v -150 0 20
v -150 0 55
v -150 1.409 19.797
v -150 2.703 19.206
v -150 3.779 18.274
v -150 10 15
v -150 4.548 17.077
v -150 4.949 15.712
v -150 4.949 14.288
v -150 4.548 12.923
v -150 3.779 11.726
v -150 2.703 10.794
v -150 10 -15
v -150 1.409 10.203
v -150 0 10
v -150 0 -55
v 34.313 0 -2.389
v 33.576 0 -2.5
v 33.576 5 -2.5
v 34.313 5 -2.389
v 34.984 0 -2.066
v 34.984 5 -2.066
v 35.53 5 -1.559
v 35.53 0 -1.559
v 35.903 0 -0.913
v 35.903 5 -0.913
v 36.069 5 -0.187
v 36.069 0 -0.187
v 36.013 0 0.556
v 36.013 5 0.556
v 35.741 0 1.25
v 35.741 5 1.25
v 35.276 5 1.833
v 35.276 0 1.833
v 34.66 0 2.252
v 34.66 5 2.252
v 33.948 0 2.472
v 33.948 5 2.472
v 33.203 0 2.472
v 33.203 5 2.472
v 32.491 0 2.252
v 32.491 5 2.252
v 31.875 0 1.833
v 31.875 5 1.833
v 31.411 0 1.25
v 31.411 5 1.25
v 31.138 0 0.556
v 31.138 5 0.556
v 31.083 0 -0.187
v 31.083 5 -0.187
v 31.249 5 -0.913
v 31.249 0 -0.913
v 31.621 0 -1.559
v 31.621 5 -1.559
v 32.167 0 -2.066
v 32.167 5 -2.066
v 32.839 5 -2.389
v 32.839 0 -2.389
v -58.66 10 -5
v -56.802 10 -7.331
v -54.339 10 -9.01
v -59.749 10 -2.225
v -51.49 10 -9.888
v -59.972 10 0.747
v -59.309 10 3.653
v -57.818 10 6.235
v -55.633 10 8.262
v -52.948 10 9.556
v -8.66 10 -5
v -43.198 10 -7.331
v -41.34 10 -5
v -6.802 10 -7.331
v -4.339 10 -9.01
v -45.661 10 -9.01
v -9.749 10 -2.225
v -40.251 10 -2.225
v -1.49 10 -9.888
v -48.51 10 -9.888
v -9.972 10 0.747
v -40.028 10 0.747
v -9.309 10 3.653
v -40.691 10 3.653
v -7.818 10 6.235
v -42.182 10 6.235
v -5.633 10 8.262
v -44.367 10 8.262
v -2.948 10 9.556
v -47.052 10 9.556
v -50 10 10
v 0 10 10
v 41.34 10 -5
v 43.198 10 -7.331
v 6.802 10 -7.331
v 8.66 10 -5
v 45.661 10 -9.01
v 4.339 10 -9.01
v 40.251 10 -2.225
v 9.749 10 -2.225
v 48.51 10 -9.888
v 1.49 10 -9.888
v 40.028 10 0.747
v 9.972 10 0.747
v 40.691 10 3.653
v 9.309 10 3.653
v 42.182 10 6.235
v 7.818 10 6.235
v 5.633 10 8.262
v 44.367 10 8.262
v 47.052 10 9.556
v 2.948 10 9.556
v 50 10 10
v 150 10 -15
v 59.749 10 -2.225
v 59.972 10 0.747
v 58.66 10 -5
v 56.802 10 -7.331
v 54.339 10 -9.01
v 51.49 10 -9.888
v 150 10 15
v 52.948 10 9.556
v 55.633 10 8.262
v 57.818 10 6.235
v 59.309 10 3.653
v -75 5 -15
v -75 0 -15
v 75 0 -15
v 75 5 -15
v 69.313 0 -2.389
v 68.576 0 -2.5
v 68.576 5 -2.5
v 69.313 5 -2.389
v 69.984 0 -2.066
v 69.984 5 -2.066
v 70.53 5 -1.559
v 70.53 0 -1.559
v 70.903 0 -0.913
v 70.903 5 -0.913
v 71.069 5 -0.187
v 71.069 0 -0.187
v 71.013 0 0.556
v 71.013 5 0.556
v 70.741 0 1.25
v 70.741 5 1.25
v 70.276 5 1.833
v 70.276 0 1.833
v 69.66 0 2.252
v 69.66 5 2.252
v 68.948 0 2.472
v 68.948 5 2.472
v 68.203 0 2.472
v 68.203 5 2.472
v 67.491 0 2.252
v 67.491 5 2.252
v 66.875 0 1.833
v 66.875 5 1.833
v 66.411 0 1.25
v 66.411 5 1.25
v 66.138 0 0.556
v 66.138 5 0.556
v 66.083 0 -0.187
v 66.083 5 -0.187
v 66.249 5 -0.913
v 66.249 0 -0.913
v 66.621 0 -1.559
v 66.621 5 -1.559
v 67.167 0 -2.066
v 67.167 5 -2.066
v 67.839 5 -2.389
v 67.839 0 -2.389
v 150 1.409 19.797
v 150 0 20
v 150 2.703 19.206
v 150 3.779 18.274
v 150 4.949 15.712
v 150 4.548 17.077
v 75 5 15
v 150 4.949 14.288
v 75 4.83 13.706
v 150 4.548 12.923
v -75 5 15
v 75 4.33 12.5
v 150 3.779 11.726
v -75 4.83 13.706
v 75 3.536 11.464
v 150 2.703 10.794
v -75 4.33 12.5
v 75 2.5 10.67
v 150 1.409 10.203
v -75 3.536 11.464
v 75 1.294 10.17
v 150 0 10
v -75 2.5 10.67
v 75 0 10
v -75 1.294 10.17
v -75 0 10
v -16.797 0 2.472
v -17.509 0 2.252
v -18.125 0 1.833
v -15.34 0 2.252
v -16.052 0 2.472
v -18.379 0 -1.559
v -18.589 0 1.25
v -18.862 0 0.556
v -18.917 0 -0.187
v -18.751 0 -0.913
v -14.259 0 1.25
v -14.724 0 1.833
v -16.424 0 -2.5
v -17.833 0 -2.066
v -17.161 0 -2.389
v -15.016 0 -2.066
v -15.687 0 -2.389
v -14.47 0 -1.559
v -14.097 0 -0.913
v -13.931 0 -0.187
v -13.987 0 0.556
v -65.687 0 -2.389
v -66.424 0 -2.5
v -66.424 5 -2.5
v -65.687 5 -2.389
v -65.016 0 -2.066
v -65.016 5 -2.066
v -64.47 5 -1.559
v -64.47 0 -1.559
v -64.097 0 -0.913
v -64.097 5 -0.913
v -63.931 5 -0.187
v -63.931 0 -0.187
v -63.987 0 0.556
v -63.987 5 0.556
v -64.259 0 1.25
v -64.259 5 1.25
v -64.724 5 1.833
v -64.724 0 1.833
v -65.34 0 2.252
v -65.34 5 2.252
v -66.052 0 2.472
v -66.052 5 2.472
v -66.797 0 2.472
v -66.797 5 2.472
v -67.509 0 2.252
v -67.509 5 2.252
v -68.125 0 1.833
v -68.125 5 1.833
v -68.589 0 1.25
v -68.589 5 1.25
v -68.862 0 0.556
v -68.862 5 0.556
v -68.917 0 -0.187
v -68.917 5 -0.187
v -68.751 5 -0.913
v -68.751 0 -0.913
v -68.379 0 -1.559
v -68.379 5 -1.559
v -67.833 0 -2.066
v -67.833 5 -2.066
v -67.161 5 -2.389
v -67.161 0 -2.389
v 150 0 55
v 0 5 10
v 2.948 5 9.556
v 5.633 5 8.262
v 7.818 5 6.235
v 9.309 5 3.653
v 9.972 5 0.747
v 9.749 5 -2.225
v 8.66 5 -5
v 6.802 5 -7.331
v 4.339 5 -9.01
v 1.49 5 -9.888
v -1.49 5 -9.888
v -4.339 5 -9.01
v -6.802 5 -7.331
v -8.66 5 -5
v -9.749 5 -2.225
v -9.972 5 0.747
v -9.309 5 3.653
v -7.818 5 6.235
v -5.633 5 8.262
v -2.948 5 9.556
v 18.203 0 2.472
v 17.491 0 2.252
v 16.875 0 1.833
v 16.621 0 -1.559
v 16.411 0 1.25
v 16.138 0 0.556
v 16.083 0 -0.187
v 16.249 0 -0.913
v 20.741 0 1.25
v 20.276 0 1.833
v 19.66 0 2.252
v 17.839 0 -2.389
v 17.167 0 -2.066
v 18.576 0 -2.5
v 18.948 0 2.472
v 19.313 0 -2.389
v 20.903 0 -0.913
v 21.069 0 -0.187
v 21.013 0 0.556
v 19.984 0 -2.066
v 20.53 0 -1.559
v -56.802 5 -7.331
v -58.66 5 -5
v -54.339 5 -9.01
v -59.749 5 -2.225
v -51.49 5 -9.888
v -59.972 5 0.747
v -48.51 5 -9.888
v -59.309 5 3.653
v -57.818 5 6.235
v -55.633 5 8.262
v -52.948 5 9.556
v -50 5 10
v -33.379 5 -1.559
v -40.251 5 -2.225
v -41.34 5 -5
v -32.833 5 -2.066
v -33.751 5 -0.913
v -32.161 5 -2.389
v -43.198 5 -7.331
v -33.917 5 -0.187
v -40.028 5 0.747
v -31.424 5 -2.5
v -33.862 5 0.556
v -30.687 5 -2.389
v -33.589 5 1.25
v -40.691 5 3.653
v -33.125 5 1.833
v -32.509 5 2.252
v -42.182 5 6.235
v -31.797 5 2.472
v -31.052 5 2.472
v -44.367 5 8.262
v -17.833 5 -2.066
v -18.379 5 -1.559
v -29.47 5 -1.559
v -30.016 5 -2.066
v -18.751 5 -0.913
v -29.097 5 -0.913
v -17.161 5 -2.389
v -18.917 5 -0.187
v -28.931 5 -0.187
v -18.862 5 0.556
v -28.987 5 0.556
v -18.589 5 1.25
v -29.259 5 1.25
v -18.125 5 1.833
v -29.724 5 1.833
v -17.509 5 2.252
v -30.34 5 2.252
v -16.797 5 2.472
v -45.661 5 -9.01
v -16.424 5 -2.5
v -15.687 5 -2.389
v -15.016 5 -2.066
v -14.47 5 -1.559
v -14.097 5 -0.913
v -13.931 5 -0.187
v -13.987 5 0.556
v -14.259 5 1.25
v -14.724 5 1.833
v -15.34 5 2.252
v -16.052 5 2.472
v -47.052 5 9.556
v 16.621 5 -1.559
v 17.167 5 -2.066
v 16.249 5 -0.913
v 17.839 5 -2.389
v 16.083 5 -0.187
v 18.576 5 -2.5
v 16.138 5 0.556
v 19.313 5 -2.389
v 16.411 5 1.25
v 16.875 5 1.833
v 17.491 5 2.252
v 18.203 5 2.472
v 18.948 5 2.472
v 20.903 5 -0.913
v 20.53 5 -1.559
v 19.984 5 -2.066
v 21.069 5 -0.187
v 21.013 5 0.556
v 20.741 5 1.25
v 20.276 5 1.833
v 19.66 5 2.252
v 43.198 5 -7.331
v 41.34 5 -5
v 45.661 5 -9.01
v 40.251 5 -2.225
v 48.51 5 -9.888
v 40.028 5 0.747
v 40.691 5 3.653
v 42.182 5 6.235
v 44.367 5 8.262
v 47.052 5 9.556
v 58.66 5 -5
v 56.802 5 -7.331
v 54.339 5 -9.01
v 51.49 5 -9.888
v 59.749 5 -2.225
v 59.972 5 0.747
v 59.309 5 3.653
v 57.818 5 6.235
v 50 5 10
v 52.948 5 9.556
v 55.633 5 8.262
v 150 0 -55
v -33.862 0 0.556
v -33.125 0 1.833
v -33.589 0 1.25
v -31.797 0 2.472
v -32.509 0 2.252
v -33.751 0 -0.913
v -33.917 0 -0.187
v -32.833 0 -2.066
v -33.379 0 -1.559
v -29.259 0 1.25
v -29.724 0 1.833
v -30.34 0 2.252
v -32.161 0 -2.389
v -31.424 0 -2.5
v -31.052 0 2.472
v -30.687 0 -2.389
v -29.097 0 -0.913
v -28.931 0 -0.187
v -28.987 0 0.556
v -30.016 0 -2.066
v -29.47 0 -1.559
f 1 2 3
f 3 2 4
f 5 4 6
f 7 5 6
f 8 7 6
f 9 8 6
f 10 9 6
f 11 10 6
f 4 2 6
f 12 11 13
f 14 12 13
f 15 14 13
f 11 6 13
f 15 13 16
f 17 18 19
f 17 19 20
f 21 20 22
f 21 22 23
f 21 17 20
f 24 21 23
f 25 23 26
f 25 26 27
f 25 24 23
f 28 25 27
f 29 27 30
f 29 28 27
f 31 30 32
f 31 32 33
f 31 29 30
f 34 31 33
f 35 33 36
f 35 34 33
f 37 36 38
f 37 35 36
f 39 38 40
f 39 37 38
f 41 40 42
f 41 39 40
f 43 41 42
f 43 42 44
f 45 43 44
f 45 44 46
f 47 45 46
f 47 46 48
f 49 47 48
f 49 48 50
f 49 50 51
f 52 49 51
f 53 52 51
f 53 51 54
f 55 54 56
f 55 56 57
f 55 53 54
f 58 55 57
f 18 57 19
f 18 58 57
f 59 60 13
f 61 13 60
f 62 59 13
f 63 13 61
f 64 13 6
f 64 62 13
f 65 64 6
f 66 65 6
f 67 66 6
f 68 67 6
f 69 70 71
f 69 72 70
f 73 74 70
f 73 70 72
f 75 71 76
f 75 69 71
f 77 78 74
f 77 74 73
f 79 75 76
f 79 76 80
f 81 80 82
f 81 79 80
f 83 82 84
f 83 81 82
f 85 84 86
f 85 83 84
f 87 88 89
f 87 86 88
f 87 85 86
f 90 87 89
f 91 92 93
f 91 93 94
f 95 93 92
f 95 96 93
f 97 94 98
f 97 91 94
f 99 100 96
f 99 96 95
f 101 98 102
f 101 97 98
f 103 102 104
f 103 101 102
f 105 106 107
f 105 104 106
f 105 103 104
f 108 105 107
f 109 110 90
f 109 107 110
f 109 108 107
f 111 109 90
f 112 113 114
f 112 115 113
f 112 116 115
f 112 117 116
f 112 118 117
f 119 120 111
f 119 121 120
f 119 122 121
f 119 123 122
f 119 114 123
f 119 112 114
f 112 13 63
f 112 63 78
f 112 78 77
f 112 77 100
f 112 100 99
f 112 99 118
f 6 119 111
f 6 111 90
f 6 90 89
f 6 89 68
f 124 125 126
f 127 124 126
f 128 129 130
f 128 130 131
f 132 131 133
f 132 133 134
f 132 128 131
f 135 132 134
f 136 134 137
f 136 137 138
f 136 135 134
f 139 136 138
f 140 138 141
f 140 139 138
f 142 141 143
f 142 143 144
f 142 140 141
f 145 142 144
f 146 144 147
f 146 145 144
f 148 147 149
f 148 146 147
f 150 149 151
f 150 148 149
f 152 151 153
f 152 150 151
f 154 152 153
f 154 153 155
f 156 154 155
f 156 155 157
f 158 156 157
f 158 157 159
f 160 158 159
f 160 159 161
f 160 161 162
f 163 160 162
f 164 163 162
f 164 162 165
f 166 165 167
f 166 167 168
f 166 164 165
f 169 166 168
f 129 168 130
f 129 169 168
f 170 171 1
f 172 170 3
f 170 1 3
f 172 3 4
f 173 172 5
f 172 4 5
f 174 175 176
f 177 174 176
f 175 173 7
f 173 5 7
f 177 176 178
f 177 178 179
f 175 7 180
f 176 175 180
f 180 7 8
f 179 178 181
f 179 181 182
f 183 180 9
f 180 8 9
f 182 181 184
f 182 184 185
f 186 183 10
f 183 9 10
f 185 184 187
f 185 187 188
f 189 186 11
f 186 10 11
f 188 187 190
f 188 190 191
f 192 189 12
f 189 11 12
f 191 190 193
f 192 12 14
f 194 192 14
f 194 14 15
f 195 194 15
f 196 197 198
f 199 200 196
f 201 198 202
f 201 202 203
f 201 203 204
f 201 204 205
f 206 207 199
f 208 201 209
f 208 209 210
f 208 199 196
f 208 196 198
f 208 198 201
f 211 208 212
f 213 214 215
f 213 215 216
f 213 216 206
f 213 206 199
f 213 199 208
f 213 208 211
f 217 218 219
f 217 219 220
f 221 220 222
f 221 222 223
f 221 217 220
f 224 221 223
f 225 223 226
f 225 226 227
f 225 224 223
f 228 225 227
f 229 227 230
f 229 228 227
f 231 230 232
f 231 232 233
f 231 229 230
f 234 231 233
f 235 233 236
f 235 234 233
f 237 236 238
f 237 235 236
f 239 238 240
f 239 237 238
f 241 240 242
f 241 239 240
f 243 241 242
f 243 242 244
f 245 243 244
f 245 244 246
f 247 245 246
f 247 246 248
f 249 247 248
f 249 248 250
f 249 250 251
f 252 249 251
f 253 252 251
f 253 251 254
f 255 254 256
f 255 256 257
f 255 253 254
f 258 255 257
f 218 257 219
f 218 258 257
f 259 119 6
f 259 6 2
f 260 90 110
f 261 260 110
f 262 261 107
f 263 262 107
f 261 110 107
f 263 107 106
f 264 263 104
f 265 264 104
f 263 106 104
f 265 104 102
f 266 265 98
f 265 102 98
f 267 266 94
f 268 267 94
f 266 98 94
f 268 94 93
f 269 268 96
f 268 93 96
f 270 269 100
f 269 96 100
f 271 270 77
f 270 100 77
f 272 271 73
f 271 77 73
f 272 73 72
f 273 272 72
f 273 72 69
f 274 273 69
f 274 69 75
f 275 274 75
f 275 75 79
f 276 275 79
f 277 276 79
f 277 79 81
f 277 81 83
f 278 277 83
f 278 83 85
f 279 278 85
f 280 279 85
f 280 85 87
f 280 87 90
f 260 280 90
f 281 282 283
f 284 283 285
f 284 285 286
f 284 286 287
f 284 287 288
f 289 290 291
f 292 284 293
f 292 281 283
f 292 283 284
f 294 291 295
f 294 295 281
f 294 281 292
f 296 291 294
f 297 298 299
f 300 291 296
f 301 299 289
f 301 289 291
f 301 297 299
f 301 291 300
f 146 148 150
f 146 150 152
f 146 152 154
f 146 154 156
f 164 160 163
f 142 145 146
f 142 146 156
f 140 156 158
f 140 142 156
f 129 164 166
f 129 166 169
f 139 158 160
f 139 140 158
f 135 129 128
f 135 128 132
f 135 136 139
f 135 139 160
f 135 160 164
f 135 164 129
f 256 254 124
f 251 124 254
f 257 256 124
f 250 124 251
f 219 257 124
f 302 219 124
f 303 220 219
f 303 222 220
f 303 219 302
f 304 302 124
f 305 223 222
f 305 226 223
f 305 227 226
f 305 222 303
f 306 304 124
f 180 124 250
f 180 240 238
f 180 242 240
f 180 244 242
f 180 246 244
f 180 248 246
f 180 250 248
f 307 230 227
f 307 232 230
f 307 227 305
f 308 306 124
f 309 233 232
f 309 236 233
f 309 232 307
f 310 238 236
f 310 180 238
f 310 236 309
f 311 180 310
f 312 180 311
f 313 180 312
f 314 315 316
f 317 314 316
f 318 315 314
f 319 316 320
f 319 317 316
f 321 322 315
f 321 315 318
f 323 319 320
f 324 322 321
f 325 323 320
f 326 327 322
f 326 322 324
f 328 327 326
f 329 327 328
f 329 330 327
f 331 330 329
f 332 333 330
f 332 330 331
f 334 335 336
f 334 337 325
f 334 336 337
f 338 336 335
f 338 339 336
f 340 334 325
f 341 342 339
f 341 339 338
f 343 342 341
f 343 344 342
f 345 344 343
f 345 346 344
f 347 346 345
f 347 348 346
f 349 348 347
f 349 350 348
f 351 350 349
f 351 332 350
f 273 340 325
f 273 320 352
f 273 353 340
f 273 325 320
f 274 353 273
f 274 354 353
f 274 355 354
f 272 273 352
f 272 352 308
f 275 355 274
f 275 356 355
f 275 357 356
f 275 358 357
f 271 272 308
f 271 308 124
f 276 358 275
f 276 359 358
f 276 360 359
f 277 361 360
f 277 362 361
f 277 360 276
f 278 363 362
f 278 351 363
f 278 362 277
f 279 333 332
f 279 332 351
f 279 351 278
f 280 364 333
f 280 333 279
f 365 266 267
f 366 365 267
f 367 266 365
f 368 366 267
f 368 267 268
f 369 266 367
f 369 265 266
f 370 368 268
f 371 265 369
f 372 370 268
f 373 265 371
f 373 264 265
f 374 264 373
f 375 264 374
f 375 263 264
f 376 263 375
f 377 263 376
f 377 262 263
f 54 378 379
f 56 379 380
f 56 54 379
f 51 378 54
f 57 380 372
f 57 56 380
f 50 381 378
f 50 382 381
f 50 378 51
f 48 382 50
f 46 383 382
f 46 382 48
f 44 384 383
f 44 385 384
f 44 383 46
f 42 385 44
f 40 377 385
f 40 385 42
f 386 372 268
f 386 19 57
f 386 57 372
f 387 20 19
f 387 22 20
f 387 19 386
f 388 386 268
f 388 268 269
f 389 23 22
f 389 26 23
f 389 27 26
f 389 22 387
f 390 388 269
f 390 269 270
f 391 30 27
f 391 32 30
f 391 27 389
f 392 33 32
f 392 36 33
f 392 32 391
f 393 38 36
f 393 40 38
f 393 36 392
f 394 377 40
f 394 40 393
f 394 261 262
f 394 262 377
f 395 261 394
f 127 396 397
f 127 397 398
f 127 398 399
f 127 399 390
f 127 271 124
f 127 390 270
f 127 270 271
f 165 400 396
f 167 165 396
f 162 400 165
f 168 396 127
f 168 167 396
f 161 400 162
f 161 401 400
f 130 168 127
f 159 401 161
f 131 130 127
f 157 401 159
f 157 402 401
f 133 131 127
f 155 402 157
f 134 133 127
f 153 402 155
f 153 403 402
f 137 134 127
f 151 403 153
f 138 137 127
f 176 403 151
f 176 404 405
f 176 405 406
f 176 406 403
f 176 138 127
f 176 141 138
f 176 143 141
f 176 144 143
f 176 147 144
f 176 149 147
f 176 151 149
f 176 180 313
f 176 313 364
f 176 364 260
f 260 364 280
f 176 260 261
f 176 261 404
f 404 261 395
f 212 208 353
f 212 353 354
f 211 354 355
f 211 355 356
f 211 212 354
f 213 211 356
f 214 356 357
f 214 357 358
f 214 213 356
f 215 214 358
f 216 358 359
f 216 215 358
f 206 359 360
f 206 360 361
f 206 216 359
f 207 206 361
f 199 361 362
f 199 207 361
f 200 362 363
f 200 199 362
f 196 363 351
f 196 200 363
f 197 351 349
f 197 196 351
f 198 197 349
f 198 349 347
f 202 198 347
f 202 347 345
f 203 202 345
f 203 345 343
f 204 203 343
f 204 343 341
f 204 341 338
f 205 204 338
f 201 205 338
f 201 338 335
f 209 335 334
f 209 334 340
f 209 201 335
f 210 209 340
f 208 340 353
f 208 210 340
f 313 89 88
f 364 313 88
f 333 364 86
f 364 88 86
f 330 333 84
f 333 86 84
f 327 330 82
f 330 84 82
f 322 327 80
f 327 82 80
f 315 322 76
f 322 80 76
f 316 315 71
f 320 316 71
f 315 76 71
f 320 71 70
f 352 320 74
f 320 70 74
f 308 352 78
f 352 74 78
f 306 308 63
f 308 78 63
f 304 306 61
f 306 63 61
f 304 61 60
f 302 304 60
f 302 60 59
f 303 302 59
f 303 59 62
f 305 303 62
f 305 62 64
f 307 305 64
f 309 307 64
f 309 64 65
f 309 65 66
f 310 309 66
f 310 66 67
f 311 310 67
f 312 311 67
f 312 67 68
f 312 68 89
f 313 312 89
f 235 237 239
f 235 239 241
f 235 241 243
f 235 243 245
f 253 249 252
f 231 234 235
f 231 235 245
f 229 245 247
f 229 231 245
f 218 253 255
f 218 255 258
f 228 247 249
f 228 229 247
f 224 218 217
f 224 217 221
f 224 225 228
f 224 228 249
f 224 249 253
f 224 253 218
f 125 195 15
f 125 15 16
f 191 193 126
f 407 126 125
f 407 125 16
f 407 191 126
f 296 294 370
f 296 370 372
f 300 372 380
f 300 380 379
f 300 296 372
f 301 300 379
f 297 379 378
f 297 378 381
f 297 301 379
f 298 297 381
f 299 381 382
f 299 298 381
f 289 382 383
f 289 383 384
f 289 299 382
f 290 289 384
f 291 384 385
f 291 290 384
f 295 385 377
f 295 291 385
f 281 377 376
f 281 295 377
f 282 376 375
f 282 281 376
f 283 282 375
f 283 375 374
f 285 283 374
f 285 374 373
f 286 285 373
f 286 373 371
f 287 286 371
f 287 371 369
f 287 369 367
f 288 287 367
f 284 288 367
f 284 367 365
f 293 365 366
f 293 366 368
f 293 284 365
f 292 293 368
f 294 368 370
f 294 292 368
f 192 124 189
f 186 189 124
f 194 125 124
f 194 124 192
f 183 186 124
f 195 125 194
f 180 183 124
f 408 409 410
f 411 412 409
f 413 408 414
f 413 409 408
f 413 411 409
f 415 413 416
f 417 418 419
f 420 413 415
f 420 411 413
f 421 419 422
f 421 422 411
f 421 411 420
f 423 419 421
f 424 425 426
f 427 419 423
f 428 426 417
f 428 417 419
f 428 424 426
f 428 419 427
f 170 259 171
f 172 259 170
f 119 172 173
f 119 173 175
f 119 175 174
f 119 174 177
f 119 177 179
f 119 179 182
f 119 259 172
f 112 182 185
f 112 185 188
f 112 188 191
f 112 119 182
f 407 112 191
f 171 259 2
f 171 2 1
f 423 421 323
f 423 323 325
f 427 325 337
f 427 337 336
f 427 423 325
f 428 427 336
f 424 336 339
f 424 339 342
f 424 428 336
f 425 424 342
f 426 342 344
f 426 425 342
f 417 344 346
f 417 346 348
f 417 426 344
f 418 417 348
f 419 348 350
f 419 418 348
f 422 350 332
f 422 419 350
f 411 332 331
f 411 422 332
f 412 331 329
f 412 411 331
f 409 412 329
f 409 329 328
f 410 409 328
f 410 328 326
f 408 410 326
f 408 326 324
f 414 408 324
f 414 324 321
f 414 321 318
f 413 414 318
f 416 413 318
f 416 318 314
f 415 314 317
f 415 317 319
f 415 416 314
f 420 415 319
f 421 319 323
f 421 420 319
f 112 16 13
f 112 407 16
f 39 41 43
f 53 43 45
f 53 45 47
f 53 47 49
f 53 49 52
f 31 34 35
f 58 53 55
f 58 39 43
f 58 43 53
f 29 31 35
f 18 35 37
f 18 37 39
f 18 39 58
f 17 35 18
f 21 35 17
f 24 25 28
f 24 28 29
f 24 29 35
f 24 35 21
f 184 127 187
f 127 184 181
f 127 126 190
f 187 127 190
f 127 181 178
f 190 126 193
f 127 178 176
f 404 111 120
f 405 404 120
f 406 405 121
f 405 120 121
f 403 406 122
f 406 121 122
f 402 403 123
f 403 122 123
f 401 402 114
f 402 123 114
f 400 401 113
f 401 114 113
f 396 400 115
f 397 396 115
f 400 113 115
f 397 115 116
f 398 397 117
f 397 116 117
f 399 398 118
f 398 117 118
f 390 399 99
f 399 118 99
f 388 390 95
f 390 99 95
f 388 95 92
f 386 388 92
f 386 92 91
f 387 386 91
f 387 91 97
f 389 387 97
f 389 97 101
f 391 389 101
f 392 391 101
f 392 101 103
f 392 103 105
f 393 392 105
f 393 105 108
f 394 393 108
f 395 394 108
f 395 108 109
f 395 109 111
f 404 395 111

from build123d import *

# Parameters (mm, degrees)
BOSS_EXTRU_1_DEPTH      = 150
ESQUISSE3_R             = 5
ENL_V_MAT_EXTRU_1_DEPTH = 306.163890393
ESQUISSE5_R             = 10
ENL_V_MAT_EXTRU_2_DEPTH = 161.078105936
ESQUISSE6_W             = 150
ESQUISSE6_H             = 30
ESQUISSE6_R             = 2.5
ENL_V_MAT_EXTRU_3_DEPTH = 5


with BuildPart() as part:
    # Esquisse2 → Boss.-Extru.1 (new, symmetric)
    with BuildSketch(Plane(origin=(0, 0, 0), x_dir=(0, 0, -1), z_dir=(1, 0, 0))):
        Polygon((15, 0), (55, 0), (15, 10), (-15, 10), (-55, 0), (-15, 0), align=None)
    extrude(amount=BOSS_EXTRU_1_DEPTH, both=True)

    # Esquisse3 → Enlèv. mat.-Extru.1 (cut, through all)
    with BuildSketch(Plane.ZY.offset(150)):
        with Locations((15, 0)):
            Circle(ESQUISSE3_R)
    extrude(amount=-ENL_V_MAT_EXTRU_1_DEPTH, mode=Mode.SUBTRACT)

    # Esquisse5 → Enlèv. mat.-Extru.2 (cut, through all)
    with BuildSketch(Plane(origin=(0, 10, 0), x_dir=(1, 0, 0), z_dir=(0, 1, 0))):
        with Locations(Location((0, 0, 0), (0, 0, 270))):
            Circle(ESQUISSE5_R)
        with Locations(Location((50, 0, 0), (0, 0, 270))):
            Circle(ESQUISSE5_R)
        with Locations(Location((-50, 0, 0), (0, 0, 270))):
            Circle(ESQUISSE5_R)
    extrude(amount=-ENL_V_MAT_EXTRU_2_DEPTH, mode=Mode.SUBTRACT)

    # Esquisse6 → Enlèv. mat.-Extru.3 (cut)
    with BuildSketch(Plane.XZ):
        Rectangle(ESQUISSE6_W, ESQUISSE6_H)
        with Locations(Location((-66.424308402, 0, 0), (0, 0, 270))):
            Circle(ESQUISSE6_R, mode=Mode.SUBTRACT)
        with Locations(Location((-31.424308402, 0, 0), (0, 0, 270))):
            Circle(ESQUISSE6_R, mode=Mode.SUBTRACT)
        with Locations(Location((-16.424308402, 0, 0), (0, 0, 270))):
            Circle(ESQUISSE6_R, mode=Mode.SUBTRACT)
        with Locations(Location((18.575691598, 0, 0), (0, 0, 270))):
            Circle(ESQUISSE6_R, mode=Mode.SUBTRACT)
        with Locations(Location((33.575691598, 0, 0), (0, 0, 270))):
            Circle(ESQUISSE6_R, mode=Mode.SUBTRACT)
        with Locations(Location((68.575691598, 0, 0), (0, 0, 270))):
            Circle(ESQUISSE6_R, mode=Mode.SUBTRACT)
    extrude(amount=-ENL_V_MAT_EXTRU_3_DEPTH, mode=Mode.SUBTRACT)


solid = part.part
